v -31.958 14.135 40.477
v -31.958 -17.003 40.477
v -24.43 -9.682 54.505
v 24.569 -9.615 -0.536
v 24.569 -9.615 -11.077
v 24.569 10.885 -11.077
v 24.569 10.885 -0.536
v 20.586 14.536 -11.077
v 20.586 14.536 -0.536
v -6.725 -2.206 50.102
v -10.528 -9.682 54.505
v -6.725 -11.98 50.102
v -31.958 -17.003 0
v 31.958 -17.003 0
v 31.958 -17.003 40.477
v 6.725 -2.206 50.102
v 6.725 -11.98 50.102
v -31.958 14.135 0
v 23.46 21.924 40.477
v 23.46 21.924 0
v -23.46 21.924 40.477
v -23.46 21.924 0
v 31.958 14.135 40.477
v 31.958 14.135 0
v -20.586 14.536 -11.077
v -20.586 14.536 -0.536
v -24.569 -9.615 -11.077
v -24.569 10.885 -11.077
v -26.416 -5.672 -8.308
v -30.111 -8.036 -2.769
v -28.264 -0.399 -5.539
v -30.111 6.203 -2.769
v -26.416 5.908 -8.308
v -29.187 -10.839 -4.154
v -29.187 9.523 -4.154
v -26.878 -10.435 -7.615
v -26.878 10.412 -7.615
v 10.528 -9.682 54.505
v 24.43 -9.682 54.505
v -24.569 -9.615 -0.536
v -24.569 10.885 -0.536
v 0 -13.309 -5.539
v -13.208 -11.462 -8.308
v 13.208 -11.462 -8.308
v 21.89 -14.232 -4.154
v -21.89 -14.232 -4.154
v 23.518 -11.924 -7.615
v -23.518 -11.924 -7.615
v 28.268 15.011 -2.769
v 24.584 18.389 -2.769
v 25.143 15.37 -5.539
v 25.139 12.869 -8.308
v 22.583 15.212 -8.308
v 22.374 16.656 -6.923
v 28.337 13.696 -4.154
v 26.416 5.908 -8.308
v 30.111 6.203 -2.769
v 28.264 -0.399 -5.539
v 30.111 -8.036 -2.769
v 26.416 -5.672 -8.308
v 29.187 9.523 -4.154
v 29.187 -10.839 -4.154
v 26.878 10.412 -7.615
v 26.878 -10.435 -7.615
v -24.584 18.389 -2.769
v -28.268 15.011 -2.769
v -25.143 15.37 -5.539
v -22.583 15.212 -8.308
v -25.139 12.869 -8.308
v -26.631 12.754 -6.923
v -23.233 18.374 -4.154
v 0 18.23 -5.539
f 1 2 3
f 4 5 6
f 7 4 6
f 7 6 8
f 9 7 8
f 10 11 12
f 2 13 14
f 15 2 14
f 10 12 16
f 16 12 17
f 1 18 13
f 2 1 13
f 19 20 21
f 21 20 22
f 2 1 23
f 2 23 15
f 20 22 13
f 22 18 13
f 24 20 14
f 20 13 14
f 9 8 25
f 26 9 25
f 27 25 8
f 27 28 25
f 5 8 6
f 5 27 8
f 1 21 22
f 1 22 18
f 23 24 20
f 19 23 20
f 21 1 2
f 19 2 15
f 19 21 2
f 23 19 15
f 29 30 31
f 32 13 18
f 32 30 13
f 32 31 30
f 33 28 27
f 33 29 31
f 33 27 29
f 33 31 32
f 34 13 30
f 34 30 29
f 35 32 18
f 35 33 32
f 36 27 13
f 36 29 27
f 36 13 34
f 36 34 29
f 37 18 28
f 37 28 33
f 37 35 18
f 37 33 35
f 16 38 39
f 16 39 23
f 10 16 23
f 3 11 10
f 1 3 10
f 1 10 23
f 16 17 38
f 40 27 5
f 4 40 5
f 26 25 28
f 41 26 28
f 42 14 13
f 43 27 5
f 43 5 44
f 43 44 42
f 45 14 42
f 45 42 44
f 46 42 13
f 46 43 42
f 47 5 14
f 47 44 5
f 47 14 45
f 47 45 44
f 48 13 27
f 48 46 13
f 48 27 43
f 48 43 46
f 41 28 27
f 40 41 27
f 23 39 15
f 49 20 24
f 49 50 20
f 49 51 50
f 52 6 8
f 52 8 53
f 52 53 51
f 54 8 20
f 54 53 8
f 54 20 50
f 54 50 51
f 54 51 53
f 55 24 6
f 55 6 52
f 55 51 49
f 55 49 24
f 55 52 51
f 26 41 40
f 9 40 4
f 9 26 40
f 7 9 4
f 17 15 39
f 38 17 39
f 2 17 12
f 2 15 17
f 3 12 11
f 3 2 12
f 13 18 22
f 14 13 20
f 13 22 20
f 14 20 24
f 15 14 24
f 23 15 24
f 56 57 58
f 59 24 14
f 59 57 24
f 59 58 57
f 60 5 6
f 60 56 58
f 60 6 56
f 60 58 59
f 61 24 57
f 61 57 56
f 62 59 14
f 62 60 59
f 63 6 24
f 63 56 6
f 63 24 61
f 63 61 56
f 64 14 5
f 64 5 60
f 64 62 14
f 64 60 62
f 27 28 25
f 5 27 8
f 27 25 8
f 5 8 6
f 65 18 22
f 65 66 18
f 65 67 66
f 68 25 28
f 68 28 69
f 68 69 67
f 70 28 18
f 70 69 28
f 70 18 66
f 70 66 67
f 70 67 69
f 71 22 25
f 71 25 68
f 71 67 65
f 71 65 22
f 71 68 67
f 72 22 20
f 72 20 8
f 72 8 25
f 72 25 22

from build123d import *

# Parameters (mm, degrees)
F1_DEPTH = 10.54079
F3_DEPTH = 40.47675
F6_DEPTH = 63.9154165983
F8_DEPTH = 38.9284920647


with BuildPart() as f1:
    # F0 (on Top) → F1 (new body)
    with BuildSketch(Plane.XY):
        Polygon((20.5864314835, 14.5359879601), (-20.5864314835, 14.5359879601), (-24.5693381876, 10.884988199), (-24.5693381876, -9.6147637814), (0, -9.6147637814), (24.5693381876, -9.6147637814), (24.5693381876, 10.884988199), align=None)
    extrude(amount=F1_DEPTH)


with BuildPart() as f1_1:
    # F2: moved
    add(f1.part.moved(Location((0, 0, -11.07701))))


with BuildPart() as f3:
    # F0 (on Top) → F3 (new body)
    with BuildSketch(Plane.XY):
        Polygon((23.4603880877, 21.9243580716), (-23.4603880877, 21.9243580716), (-31.9577082992, 14.1351437196), (-31.9577082992, -17.003133893), (0, -17.003133893), (31.9577082992, -17.003133893), (31.9577082992, 14.1351437196), align=None)
        Polygon((-24.5693381876, 10.884988199), (-20.5864314835, 14.5359879601), (20.5864314835, 14.5359879601), (24.5693381876, 10.884988199), (24.5693381876, -9.6147637814), (0, -9.6147637814), (-24.5693381876, -9.6147637814), align=None, mode=Mode.SUBTRACT)
        Polygon((20.5864314835, 14.5359879601), (-20.5864314835, 14.5359879601), (-24.5693381876, 10.884988199), (-24.5693381876, -9.6147637814), (0, -9.6147637814), (24.5693381876, -9.6147637814), (24.5693381876, 10.884988199), align=None)
    extrude(amount=F3_DEPTH)


with BuildPart() as f4:
    # F3_face (on face) → F4 section 0
    with BuildSketch(Plane(origin=(0, 1.9996451768, 0), x_dir=(1, 0, 0), z_dir=(0, 0, -1))):
        Polygon((-23.4603880877, -19.9247128949), (23.4603880877, -19.9247128949), (31.9577082992, -12.1354985429), (31.9577082992, 19.0027790698), (-31.9577082992, 19.0027790698), (-31.9577082992, -12.1354985429), align=None)
    # F1_face (on face) → F4 section 1
    with BuildSketch(Plane(origin=(0, 2.3259091177, -11.07701), x_dir=(1, 0, 0), z_dir=(0, 0, -1))):
        Polygon((-20.5864314835, -12.2100788423), (20.5864314835, -12.2100788423), (24.5693381876, -8.5590790812), (24.5693381876, 11.9406728992), (-24.5693381876, 11.9406728992), (-24.5693381876, -8.5590790812), align=None)
    loft()


with BuildPart() as f6:
    # F5 (on face) → F6 (new body, through all)
    with BuildSketch(Plane(origin=(-31.9577082992, 0, 0), x_dir=(0, -1, 0), z_dir=(-1, 0, 0))):
        Polygon((-14.1351437196, 40.47675), (17.003133893, 40.47675), (9.6820257604, 54.5051917434), align=None)
    extrude(amount=-F6_DEPTH)

    # F7 (on face) → F8 (cut, through all)
    with BuildSketch(Plane.XZ.offset(17.003133893)):
        Polygon((31.9577082992, 40.47675), (31.9577082992, 54.5051917434), (24.4301687926, 54.5051917434), align=None)
        Polygon((-31.9577082992, 40.47675), (-24.4301687926, 54.5051917434), (-31.9577082992, 54.5051917434), align=None)
        Polygon((6.7252744921, 50.1016229391), (10.5276070535, 54.5051917434), (-10.5276070535, 54.5051917434), (-6.7252744921, 50.1016229391), (0, 50.1016229391), align=None)
    extrude(amount=-F8_DEPTH, mode=Mode.SUBTRACT)


solid = Compound([f1_1.part, f3.part, f4.part, f6.part])
